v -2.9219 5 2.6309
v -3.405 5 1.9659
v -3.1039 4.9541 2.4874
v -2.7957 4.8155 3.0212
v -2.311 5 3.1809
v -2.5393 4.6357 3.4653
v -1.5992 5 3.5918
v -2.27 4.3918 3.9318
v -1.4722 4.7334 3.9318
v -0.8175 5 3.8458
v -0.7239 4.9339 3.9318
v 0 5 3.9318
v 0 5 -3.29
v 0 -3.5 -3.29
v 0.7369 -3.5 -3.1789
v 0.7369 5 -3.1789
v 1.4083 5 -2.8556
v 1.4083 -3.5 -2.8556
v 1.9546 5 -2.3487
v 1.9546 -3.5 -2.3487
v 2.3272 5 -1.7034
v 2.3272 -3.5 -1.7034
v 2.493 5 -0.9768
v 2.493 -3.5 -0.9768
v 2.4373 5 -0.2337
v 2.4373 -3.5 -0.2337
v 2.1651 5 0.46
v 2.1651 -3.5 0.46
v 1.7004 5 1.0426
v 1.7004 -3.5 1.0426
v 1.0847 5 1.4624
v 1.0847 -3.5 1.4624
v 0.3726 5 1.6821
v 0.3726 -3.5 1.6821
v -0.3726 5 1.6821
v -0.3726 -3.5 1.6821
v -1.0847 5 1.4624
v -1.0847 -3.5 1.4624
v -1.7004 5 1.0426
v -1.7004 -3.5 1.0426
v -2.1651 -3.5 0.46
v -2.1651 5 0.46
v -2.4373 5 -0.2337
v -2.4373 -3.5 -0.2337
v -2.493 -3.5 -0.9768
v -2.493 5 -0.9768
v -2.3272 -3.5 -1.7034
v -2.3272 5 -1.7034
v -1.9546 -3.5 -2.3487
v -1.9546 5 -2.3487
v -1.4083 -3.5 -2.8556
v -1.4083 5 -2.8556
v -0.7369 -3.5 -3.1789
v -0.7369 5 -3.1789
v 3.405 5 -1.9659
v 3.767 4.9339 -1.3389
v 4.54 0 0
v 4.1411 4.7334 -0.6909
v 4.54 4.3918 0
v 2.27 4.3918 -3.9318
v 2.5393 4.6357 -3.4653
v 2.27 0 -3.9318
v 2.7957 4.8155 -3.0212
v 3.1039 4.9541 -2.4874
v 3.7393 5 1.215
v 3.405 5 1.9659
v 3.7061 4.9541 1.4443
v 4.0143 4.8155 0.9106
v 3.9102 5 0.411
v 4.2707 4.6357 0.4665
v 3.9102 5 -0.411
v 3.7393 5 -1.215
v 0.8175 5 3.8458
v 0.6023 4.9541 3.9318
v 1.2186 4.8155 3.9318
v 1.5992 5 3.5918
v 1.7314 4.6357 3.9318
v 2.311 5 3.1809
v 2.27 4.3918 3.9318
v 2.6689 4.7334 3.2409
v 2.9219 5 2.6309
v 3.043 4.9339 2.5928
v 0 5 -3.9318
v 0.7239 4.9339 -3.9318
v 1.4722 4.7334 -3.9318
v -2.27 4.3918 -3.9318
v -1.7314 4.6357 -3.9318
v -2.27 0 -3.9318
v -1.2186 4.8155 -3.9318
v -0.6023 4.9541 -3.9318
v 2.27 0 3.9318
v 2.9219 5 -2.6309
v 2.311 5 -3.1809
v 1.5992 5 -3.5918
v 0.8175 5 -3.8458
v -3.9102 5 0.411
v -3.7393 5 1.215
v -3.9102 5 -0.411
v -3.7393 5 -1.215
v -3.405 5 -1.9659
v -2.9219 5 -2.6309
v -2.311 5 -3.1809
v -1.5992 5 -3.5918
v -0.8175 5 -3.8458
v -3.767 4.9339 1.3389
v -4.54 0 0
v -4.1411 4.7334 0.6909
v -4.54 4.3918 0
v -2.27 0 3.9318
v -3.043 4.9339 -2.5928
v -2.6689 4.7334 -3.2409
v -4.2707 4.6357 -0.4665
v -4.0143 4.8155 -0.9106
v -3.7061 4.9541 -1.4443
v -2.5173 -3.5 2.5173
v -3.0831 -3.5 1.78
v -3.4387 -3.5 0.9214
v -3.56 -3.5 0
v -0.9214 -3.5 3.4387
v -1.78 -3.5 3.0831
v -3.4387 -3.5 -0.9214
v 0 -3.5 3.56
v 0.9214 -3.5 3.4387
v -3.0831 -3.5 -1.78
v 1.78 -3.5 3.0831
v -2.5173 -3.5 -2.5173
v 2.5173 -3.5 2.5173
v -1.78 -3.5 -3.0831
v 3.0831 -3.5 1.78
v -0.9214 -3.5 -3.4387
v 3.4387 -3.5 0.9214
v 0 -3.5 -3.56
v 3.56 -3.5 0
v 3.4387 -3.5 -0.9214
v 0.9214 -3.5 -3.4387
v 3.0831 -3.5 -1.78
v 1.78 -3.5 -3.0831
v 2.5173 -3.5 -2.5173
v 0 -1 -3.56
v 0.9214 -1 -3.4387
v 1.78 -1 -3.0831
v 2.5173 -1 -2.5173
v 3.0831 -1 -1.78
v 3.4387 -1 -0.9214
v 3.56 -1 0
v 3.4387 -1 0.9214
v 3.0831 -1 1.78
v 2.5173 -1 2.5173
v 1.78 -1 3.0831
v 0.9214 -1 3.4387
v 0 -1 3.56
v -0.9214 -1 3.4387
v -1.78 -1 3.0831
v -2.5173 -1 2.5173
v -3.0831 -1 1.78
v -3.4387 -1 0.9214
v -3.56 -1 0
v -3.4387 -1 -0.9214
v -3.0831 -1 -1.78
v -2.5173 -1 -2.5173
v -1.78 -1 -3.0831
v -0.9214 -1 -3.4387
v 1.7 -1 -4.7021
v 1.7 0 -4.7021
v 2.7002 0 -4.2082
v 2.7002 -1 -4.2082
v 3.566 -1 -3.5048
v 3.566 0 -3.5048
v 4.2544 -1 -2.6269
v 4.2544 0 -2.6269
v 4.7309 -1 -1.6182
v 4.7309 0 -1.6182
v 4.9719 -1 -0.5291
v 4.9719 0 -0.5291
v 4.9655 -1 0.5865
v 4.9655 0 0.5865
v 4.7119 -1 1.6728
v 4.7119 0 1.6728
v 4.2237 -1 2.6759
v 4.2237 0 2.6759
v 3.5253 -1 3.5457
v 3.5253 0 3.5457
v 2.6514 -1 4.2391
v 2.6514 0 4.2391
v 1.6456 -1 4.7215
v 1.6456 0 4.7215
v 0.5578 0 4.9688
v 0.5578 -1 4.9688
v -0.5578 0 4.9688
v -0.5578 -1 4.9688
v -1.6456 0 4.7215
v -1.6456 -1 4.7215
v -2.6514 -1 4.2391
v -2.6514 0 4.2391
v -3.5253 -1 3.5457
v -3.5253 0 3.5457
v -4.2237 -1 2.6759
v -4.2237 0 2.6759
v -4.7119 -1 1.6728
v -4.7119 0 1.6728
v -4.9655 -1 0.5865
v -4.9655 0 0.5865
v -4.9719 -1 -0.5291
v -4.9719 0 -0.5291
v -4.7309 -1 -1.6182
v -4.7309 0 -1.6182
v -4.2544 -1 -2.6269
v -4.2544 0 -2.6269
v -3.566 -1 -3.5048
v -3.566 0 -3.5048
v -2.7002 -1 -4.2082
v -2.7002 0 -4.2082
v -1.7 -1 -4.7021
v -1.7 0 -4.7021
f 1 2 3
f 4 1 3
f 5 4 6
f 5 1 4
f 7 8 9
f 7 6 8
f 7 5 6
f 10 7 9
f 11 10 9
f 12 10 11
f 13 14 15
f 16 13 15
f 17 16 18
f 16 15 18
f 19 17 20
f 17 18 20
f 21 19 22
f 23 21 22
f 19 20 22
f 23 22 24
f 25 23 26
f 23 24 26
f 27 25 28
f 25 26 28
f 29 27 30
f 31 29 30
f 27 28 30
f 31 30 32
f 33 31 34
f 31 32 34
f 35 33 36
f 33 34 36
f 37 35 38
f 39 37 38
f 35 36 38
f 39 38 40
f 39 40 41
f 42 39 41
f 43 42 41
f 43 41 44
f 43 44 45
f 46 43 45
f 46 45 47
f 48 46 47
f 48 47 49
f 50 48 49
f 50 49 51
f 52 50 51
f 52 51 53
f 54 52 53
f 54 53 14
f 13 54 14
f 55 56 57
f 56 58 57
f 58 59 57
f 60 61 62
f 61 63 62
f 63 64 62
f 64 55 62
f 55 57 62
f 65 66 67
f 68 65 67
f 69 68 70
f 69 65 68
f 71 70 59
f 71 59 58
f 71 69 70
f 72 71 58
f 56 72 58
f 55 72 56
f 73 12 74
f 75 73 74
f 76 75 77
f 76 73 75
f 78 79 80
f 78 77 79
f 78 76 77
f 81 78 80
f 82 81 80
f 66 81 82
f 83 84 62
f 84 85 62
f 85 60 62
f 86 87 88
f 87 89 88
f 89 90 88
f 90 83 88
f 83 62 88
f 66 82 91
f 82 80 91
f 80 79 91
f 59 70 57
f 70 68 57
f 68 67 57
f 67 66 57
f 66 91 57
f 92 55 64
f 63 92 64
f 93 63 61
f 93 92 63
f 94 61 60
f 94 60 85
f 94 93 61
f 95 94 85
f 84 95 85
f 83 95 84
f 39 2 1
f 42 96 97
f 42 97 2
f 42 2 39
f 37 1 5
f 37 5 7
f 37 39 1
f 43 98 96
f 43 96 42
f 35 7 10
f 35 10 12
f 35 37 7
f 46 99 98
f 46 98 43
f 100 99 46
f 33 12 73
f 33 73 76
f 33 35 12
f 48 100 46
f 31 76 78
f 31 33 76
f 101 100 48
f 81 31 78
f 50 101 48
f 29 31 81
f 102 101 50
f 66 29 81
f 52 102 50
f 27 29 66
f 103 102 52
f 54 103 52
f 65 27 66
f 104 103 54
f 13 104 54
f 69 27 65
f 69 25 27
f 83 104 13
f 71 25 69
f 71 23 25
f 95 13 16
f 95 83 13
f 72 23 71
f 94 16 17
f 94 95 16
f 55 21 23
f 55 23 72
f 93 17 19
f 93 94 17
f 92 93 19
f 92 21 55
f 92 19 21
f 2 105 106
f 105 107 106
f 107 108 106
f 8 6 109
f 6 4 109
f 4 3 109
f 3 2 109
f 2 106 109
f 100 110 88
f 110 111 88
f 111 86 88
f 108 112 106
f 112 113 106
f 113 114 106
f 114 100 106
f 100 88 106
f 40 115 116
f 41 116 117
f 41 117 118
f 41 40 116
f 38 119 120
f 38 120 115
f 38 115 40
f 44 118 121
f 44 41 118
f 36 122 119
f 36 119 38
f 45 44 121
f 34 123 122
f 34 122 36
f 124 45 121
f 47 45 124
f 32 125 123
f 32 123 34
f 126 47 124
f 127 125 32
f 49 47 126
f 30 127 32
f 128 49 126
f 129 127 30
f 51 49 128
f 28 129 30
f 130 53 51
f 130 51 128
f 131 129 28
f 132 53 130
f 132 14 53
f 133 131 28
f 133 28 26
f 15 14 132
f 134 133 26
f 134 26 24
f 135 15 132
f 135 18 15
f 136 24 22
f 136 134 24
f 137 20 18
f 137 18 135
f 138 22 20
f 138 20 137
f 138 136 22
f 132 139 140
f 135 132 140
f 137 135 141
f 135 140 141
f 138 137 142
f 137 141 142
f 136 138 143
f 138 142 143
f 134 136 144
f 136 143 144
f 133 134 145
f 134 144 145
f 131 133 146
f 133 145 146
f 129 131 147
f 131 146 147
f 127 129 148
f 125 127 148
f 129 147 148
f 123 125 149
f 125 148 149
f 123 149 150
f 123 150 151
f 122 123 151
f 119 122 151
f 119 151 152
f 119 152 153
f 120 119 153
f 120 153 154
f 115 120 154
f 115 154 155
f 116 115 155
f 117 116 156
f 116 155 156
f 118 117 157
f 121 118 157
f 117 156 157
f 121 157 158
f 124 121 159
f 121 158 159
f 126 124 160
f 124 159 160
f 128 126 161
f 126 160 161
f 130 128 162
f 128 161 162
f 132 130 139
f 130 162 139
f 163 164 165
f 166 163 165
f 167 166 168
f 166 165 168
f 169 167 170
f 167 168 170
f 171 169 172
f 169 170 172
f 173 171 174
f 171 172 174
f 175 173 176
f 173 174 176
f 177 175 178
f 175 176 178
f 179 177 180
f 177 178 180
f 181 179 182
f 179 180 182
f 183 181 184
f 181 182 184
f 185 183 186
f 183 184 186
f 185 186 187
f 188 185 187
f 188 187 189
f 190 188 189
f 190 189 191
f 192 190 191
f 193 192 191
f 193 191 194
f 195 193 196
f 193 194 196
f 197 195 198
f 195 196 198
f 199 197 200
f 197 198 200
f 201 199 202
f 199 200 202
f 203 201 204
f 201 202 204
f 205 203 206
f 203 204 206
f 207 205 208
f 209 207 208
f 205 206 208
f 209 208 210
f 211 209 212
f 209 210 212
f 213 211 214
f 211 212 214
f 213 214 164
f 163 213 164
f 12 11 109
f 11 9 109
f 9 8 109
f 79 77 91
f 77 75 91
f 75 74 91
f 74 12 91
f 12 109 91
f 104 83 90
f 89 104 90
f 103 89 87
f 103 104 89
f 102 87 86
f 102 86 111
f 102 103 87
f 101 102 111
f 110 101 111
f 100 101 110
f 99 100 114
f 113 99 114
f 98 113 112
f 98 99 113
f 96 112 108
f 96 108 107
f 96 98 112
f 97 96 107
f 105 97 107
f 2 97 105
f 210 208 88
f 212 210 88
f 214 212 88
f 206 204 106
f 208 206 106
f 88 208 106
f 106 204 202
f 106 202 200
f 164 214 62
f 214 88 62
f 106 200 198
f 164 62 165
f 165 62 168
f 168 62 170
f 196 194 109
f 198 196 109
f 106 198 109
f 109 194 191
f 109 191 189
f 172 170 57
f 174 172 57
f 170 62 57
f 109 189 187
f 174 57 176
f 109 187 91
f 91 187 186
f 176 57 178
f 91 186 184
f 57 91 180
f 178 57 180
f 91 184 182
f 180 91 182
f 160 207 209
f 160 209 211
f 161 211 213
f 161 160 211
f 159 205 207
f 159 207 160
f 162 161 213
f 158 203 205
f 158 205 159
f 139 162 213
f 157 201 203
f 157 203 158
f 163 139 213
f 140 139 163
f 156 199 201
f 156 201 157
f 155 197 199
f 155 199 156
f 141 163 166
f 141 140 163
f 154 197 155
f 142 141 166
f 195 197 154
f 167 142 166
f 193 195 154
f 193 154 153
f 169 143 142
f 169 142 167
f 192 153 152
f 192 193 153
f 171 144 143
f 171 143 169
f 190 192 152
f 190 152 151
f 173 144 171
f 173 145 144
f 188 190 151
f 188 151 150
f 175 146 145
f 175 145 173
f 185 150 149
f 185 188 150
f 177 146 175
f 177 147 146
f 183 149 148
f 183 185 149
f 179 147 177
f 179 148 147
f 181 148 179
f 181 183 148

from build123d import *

# Parameters (mm, degrees)
BOSS_EXTRUDE1_DEPTH = 5
SKETCH3_OUTSIDE_W   = 23.682
SKETCH3_OUTSIDE_H   = 22.466
SKETCH3_OUTSIDE_R   = 3.931755333
CUT_EXTRUDE1_DEPTH  = 5
CUT_EXTRUDE1_DRAFT  = -45
BOSS_EXTRUDE2_DEPTH = 1
SKETCH5_R           = 3.56
BOSS_EXTRUDE3_DEPTH = 2.5
SKETCH6_R           = 2.5
CUT_EXTRUDE2_DEPTH  = 12.056672194


with BuildPart() as part:
    # Sketch2 → Boss-Extrude1 (new body)
    with BuildSketch(Plane(origin=(0, 0, 0), x_dir=(1, 0, 0), z_dir=(0, 1, 0))):
        Polygon((2.27, -3.931755333), (4.54, 0), (2.27, 3.931755333), (-2.27, 3.931755333), (-4.54, 0), (-2.27, -3.931755333), align=None)
    extrude(amount=BOSS_EXTRUDE1_DEPTH)


with BuildPart() as cut_extrude1_tool:
    # Sketch3 outside → Cut-Extrude1 (with draft: the straight prism first)
    with BuildSketch(Plane(origin=(0, 5, 0), x_dir=(1, 0, 0), z_dir=(0, 1, 0))):
        Rectangle(SKETCH3_OUTSIDE_W, SKETCH3_OUTSIDE_H)
        Circle(SKETCH3_OUTSIDE_R, mode=Mode.SUBTRACT)
    extrude(amount=-CUT_EXTRUDE1_DEPTH)
    # Cut-Extrude1: the draft: its side faces are tilted about the plane it starts from
    cut_extrude1_sides = [cut_extrude1_tool.faces().sort_by_distance(p)[0] for p in [
        (0, 2.5, 11.233),
        (11.841, 2.5, 0),
        (0, 2.5, -11.233),
        (-11.841, 2.5, 0),
        (-3.931755333, 2.5, 0),
    ]]
    draft(cut_extrude1_sides, Plane(origin=(0, 5, 0), x_dir=(1, 0, 0), z_dir=(0, 1, 0)), CUT_EXTRUDE1_DRAFT)


with BuildPart() as part_1:
    add(part.part)

    # Cut-Extrude1: cut by cut_extrude1_tool
    add(cut_extrude1_tool.part, mode=Mode.SUBTRACT)

    # Sketch4 → Boss-Extrude2 (add)
    with BuildSketch(Plane.XZ):
        with BuildLine():
            Line((-1.7, -4.702127178), (1.7, -4.702127178))
            ThreePointArc((1.7, -4.702127178), (0, 5), (-1.7, -4.702127178))
        make_face()
    extrude(amount=BOSS_EXTRUDE2_DEPTH)

    # Sketch5 → Boss-Extrude3 (add)
    with BuildSketch(Plane.XZ.offset(1)):
        with Locations(Location((0, 0, 0), (0, 0, 270))):
            Circle(SKETCH5_R)
    extrude(amount=BOSS_EXTRUDE3_DEPTH)

    # Sketch6 → Cut-Extrude2 (cut, through all)
    with BuildSketch(Plane.XZ.offset(3.5)):
        with Locations(Location((0, -0.79, 0), (0, 0, 270))):
            Circle(SKETCH6_R)
    extrude(amount=-CUT_EXTRUDE2_DEPTH, mode=Mode.SUBTRACT)


solid = part_1.part
